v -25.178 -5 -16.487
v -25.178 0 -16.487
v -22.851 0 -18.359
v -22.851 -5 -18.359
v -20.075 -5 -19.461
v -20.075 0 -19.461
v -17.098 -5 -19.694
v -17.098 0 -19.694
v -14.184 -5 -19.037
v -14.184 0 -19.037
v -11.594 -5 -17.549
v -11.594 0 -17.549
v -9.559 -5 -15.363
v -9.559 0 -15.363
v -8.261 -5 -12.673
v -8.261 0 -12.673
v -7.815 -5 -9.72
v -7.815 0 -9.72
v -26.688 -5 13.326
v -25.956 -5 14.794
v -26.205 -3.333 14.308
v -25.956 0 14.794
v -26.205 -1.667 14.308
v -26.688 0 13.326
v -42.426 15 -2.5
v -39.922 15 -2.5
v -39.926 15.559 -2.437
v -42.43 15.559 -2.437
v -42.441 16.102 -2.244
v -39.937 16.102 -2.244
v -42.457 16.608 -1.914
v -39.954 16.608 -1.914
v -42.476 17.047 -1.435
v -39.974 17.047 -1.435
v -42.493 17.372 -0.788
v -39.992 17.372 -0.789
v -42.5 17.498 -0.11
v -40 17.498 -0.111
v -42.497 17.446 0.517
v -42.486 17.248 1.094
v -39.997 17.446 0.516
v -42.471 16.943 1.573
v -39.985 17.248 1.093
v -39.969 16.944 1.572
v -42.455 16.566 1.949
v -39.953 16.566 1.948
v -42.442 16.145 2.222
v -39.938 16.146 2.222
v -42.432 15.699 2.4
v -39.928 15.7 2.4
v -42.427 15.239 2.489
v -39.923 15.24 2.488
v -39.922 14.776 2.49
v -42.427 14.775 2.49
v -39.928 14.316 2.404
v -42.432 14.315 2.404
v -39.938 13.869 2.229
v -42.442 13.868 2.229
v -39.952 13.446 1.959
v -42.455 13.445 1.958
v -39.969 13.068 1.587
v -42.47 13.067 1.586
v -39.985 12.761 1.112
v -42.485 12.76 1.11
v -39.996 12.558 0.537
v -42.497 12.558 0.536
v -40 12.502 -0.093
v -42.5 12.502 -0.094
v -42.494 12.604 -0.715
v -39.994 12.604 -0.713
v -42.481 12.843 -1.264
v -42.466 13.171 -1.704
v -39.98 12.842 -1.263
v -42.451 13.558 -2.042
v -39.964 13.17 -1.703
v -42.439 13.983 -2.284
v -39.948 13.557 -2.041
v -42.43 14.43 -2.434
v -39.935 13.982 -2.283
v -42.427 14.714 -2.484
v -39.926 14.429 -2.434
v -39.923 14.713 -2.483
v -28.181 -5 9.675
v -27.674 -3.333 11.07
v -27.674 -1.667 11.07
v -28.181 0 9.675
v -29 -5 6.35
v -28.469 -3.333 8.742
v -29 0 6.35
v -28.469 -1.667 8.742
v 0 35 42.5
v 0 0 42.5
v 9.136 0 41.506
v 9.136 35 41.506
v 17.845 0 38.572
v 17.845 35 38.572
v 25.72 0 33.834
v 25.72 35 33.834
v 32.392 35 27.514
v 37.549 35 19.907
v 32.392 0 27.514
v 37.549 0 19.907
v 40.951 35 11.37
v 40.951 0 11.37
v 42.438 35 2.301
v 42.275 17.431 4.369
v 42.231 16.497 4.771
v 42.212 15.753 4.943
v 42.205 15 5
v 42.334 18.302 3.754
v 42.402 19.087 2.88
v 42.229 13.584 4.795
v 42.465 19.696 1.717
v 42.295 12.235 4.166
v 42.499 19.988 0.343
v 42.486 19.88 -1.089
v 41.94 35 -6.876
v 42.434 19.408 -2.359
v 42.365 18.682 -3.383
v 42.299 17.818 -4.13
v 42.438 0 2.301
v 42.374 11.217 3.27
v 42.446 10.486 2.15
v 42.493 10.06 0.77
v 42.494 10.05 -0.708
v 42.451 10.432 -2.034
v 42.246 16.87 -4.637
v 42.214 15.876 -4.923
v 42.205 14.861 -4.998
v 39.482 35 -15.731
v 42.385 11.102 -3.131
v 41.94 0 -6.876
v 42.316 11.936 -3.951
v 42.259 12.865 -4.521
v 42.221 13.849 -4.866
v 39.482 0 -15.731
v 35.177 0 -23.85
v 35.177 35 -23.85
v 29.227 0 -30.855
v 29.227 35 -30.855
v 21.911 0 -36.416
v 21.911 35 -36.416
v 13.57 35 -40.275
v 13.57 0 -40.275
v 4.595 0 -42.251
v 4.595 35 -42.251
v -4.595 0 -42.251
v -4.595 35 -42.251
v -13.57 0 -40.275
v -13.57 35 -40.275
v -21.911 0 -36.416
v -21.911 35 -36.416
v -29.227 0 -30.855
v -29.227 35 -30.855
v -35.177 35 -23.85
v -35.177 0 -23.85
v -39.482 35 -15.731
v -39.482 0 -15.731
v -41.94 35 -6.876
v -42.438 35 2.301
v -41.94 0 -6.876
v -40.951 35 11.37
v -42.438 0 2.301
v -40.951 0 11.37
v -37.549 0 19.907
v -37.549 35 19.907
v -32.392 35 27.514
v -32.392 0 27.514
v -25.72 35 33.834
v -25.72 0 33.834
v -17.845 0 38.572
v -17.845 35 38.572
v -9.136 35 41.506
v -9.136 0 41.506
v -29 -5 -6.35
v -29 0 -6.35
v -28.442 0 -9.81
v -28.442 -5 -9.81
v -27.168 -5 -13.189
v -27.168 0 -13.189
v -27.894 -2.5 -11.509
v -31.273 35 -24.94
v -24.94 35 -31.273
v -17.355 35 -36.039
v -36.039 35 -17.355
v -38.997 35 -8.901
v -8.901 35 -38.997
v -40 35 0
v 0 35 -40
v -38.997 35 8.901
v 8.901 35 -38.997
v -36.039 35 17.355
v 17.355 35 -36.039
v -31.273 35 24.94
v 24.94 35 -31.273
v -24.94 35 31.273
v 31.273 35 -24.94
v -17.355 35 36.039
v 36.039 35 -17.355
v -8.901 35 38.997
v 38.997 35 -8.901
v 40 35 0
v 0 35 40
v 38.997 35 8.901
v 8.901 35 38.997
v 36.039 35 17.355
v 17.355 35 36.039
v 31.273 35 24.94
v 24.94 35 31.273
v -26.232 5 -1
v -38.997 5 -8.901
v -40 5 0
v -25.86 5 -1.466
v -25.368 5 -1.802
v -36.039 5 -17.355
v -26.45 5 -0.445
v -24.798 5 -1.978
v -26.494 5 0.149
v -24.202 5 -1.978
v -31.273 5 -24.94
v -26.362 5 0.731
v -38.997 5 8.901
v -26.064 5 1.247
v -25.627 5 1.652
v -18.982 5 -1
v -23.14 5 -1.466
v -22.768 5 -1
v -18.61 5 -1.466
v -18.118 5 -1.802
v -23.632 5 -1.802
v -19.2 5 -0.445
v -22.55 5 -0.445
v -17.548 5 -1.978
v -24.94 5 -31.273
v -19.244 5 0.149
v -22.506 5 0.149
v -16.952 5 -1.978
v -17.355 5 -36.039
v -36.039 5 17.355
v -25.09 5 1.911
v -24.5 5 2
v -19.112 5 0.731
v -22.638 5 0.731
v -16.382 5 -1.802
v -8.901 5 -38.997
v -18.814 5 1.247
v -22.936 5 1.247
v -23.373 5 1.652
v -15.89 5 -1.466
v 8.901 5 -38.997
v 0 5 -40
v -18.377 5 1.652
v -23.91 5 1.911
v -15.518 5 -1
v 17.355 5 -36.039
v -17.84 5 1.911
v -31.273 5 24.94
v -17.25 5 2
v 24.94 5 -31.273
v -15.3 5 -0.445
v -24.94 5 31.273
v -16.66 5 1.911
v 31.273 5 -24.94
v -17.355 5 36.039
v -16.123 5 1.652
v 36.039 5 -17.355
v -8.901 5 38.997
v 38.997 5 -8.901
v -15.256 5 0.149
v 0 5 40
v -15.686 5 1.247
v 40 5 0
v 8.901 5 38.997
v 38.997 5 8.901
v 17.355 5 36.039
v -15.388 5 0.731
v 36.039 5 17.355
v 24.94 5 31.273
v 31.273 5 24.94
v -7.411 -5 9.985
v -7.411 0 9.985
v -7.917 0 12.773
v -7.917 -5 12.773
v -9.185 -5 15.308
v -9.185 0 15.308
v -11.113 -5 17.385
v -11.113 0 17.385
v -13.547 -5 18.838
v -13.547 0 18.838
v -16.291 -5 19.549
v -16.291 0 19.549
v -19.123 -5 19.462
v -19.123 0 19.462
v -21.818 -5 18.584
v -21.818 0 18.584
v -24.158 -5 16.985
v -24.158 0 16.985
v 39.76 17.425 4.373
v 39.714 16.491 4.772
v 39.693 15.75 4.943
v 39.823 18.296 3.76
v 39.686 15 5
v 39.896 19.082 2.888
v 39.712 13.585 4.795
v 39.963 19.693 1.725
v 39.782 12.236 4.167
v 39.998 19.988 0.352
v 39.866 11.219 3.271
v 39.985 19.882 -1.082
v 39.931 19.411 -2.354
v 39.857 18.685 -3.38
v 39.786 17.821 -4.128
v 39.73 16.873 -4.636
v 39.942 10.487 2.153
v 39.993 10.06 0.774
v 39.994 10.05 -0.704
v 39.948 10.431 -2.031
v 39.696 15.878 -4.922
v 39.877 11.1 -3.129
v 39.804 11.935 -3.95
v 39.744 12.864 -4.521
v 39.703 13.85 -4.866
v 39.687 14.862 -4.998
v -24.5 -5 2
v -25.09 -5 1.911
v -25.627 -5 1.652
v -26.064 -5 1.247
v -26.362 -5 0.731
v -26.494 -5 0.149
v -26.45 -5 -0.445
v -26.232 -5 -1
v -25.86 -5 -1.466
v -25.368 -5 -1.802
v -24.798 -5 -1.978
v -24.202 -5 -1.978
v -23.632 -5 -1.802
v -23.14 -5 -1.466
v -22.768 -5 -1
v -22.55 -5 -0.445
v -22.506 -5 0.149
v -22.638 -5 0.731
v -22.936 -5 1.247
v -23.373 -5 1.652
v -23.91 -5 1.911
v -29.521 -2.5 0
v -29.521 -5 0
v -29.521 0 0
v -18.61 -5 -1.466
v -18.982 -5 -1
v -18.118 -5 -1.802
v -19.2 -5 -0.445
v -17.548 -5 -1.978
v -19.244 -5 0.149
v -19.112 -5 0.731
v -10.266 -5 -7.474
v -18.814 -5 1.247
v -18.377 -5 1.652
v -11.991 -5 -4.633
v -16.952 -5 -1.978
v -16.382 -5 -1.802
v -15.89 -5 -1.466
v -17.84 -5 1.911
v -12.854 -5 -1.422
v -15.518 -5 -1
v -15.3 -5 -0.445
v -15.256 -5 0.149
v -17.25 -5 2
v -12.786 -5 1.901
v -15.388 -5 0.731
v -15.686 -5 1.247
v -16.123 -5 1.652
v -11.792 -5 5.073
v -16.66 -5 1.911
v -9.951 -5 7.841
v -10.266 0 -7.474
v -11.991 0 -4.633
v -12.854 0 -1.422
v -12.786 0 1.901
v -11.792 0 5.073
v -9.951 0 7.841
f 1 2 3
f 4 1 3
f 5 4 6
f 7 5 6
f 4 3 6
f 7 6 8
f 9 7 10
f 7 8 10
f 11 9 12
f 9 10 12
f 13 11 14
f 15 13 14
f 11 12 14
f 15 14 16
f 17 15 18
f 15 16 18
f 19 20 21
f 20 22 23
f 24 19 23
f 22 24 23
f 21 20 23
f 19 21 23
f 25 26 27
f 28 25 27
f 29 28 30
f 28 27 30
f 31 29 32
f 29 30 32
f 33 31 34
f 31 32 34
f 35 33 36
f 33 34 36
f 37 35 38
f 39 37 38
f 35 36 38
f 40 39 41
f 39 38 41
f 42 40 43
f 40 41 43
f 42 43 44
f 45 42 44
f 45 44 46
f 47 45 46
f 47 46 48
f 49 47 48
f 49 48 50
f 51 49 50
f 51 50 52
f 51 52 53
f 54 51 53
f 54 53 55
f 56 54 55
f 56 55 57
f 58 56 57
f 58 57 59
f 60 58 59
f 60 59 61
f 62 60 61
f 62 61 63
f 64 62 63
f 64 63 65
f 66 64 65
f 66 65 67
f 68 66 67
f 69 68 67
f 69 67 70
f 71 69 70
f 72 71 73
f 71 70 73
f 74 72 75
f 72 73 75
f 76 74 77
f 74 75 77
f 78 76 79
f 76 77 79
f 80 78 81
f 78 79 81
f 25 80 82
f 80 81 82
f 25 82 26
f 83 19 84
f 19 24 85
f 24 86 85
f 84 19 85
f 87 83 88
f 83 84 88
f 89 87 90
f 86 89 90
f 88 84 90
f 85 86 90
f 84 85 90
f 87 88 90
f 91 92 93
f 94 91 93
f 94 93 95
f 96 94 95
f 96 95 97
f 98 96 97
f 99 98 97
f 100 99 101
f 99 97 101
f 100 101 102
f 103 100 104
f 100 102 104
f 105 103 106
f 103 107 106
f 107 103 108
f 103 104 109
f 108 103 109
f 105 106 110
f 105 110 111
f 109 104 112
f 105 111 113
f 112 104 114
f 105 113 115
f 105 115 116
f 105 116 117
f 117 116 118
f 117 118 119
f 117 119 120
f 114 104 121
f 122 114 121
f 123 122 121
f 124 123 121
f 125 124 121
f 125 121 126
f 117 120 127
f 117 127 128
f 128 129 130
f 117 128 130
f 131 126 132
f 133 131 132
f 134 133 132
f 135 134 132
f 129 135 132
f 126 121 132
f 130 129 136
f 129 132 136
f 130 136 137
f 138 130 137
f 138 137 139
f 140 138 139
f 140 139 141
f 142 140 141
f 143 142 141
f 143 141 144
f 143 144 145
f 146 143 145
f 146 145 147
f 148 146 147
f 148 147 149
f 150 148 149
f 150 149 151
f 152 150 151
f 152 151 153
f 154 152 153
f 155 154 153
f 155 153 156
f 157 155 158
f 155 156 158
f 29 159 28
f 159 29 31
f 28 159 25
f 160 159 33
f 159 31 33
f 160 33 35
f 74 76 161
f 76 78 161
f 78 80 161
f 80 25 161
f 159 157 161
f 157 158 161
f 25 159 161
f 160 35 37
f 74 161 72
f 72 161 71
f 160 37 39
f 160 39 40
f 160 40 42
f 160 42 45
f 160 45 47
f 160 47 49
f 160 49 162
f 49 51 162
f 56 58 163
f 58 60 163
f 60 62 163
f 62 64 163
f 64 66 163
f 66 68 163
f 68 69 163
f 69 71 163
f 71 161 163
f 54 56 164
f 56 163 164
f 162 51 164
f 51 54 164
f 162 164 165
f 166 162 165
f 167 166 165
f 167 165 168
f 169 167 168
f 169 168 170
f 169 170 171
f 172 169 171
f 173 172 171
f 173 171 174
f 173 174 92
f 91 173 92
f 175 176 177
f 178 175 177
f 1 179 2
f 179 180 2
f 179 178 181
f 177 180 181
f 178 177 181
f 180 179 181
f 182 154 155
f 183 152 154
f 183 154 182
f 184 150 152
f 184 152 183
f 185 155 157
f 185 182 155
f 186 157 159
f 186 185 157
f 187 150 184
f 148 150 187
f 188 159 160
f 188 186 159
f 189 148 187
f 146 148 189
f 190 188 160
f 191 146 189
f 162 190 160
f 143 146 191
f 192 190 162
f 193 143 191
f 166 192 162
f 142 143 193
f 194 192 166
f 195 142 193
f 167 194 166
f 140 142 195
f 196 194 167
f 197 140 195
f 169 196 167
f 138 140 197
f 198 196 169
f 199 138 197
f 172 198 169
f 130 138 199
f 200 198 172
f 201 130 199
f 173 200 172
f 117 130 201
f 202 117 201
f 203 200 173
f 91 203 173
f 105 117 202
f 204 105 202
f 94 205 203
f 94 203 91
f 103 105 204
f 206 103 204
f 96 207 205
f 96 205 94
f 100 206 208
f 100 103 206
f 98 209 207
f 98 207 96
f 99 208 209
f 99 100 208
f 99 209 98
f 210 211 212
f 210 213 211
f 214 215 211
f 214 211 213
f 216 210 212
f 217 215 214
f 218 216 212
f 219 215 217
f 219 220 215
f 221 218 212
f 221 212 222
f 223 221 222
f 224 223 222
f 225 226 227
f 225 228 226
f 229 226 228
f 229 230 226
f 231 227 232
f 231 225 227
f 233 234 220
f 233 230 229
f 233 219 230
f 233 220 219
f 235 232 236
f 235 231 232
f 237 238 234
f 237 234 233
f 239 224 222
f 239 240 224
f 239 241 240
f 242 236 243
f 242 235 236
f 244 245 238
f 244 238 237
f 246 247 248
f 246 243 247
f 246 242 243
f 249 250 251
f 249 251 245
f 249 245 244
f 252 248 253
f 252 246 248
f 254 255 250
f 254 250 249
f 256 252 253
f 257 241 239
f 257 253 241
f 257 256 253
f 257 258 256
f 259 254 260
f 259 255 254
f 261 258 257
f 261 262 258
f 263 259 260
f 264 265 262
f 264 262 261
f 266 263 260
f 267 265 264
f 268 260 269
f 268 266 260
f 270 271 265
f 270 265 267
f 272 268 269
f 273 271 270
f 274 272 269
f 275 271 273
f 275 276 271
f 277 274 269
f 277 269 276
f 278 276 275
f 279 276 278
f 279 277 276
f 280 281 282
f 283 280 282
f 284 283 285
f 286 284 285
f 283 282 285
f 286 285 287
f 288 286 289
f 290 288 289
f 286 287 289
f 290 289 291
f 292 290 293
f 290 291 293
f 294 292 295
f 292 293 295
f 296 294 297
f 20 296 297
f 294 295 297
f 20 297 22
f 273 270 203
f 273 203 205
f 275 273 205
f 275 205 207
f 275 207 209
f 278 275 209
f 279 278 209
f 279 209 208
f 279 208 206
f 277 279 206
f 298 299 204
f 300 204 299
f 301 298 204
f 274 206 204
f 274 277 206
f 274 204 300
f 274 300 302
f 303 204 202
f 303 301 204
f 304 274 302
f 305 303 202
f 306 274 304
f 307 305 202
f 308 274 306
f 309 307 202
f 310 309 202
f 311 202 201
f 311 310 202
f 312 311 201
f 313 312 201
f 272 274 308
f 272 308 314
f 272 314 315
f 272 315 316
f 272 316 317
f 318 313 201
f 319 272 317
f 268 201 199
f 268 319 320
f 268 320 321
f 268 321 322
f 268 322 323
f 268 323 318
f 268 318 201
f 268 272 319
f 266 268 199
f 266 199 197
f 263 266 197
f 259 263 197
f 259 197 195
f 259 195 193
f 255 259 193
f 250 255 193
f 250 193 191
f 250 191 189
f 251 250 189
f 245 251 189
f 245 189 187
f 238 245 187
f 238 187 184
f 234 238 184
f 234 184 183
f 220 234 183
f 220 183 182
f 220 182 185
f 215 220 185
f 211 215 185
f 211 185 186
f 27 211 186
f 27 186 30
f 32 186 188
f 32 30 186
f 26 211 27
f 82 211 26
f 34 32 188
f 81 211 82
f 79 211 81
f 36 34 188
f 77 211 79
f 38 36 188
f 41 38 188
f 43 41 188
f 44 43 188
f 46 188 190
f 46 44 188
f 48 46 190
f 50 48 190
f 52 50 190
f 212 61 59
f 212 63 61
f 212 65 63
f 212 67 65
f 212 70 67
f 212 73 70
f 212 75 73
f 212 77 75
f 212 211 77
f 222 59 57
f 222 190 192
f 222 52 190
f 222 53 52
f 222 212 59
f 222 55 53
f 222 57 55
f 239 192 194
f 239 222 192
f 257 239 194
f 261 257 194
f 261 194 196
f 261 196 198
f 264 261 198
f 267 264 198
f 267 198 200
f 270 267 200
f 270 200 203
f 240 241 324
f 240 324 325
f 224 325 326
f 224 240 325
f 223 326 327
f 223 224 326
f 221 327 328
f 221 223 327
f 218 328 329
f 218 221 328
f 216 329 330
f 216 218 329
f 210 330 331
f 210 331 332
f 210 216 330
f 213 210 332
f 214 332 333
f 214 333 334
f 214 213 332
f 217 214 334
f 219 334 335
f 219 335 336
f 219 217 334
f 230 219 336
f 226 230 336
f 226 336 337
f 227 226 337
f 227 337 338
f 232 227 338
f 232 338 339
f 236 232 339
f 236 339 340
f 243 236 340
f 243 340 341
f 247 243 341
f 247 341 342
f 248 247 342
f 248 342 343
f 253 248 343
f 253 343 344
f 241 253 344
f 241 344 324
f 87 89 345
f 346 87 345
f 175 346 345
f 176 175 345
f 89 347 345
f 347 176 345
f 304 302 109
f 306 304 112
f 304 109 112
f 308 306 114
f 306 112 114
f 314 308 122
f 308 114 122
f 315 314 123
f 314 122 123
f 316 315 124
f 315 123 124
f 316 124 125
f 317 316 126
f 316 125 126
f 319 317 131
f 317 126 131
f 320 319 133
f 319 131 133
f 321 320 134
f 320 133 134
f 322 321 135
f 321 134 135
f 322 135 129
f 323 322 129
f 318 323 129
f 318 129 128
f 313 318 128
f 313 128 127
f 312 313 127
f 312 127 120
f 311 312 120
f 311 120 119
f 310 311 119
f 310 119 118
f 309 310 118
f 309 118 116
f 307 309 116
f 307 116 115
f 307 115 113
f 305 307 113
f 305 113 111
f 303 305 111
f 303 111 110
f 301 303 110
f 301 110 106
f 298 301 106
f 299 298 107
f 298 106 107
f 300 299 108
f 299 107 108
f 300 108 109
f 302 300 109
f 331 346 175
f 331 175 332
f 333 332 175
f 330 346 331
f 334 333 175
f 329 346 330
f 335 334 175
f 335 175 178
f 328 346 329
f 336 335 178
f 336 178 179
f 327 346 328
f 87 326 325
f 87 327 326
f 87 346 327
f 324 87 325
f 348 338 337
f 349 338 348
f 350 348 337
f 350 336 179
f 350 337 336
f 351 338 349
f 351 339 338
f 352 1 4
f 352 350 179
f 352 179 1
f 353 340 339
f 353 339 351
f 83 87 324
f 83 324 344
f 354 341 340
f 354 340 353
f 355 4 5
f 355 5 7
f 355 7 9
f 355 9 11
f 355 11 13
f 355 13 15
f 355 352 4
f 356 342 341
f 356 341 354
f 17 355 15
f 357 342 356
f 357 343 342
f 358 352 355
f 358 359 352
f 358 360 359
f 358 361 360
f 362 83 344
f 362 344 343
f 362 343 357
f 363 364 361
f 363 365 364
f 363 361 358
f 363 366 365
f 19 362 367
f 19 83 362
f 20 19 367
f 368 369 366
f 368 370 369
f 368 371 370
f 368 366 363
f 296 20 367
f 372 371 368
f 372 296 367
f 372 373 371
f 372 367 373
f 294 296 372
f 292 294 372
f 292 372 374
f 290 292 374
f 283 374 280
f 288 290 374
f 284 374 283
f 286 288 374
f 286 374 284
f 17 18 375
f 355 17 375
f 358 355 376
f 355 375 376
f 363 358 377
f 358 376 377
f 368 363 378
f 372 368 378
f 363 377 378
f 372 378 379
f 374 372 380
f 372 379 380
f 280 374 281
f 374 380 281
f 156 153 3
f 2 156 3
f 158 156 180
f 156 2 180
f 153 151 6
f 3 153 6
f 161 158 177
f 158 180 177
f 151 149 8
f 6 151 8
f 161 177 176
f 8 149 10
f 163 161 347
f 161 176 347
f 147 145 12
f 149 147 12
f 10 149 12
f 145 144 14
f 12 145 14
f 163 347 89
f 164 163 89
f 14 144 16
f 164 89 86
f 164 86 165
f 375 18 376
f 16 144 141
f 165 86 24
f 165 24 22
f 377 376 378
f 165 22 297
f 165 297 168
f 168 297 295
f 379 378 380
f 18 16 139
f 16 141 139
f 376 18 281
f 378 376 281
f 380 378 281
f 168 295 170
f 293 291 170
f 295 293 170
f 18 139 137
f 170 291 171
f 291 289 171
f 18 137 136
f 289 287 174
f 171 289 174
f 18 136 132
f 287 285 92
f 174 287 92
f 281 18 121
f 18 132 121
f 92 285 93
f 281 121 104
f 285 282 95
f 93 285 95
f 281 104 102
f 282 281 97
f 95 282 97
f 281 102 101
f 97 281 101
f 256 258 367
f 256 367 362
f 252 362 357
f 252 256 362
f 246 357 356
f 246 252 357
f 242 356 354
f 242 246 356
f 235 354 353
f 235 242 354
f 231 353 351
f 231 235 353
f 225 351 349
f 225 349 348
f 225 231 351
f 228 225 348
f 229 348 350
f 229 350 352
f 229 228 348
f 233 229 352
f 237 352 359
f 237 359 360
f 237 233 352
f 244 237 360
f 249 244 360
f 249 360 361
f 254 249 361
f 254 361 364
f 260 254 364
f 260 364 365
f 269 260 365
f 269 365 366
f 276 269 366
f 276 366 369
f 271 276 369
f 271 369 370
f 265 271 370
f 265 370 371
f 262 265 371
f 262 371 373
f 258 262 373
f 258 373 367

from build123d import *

# Parameters (mm, degrees)
SKETCH1_R               = 42.5
BOSS_EXTRUDE1_DEPTH     = 5
SKETCH2_R               = 42.5
SKETCH2_R_2             = 40
BOSS_EXTRUDE2_DEPTH     = 30
SKETCH3_R               = 2
BOSS_EXTRUDE3_DEPTH     = 5
CUT_EXTRUDE1_DEPTH      = 70.552138838
CUT_EXTRUDE1_DEPTH_BACK = 70.552138838
SKETCH3_3_R             = 2
CUT_EXTRUDE4_REACH      = 71.552
CUT_EXTRUDE4_END_RADIUS = 42.5
SKETCH4_R               = 2.5
SKETCH4_5_R             = 5
CUT_EXTRUDE8_DEPTH      = 50


with BuildPart() as part:
    # Sketch1 → Boss-Extrude1 (new body)
    with BuildSketch(Plane(origin=(0, 0, 0), x_dir=(1, 0, 0), z_dir=(0, 1, 0))):
        Circle(SKETCH1_R)
    extrude(amount=BOSS_EXTRUDE1_DEPTH)

    # Sketch2 → Boss-Extrude2 (add)
    with BuildSketch(Plane(origin=(0, 5, 0), x_dir=(1, 0, 0), z_dir=(0, 1, 0))):
        Circle(SKETCH2_R)
        Circle(SKETCH2_R_2, mode=Mode.SUBTRACT)
    extrude(amount=BOSS_EXTRUDE2_DEPTH)

    # Sketch3 → Boss-Extrude3 (add)
    with BuildSketch(Plane.XZ):
        with BuildLine():
            ThreePointArc((-25.178047354, -16.486591759), (-14.183962111, -19.037364236), (-7.815144583, -9.719933589))
            ThreePointArc((-7.815144583, -9.719933589), (-12.938182194, 0.241771609), (-7.410610084, 9.984822024))
            ThreePointArc((-7.410610084, 9.984822024), (-14.893502945, 19.290955178), (-25.95577439, 14.793850517))
            add(Edge.make_bspline(
                [(-25.95577439, 14.793850517), (-26.206471304, 14.310519768), (-26.451758672, 13.821089407), (-26.688052402, 13.325870914)],
                knots=[0, 0, 0, 0, 0.050650552, 0.050650552, 0.050650552, 0.050650552], degree=3))
            add(Edge.make_bspline(
                [(-26.688052402, 13.325870914), (-27.746594537, 11.107404767), (-28.624649084, 8.772780294), (-29, 6.35)],
                knots=[0.050650552, 0.050650552, 0.050650552, 0.050650552, 0.277553495, 0.277553495, 0.277553495, 0.277553495], degree=3))
            add(Edge.make_bspline(
                [(-29, 6.35), (-30.042272144, 0), (-29, -6.35)],
                knots=[0, 0, 0, 1, 1, 1], degree=2))
            add(Edge.make_bspline(
                [(-29, -6.35), (-28.699050384, -11.600454078), (-25.178047354, -16.486591759)],
                knots=[0.67268265, 0.67268265, 0.67268265, 1, 1, 1], degree=2))
        make_face()
        with Locations((-24.5, 0)):
            Circle(SKETCH3_R, mode=Mode.SUBTRACT)
        with Locations((-17.25, 0)):
            Circle(SKETCH3_R, mode=Mode.SUBTRACT)
    extrude(amount=BOSS_EXTRUDE3_DEPTH)

    # Sketch3<3> → Cut-Extrude1 (cut, two sides: drawn at the far end of the back side and taken through both)
    with BuildSketch(Plane.XZ.offset(-CUT_EXTRUDE1_DEPTH_BACK)):
        with Locations((-24.5, 0)):
            Circle(SKETCH3_3_R)
        with Locations((-17.25, 0)):
            Circle(SKETCH3_3_R)
    extrude(amount=CUT_EXTRUDE1_DEPTH + CUT_EXTRUDE1_DEPTH_BACK, mode=Mode.SUBTRACT)

    # Cut-Extrude4: up to this cylinder (the profile starts inside it)
    cut_extrude4_end = Plane(origin=(0, 15, 0), z_dir=(0, -1, 0)) * Cylinder(CUT_EXTRUDE4_END_RADIUS, 229.104, mode=Mode.PRIVATE)
    # Sketch4 → Cut-Extrude4 (cut, up to the surface)
    with BuildSketch(Plane(origin=(0, 0, 0), x_dir=(0, 0, -1), z_dir=(1, 0, 0)), mode=Mode.PRIVATE) as cut_extrude4_sk1:
        with Locations((0, 15)):
            Circle(SKETCH4_R)
    cut_extrude4_tool1 = extrude(cut_extrude4_sk1.sketch, amount=-CUT_EXTRUDE4_REACH, mode=Mode.PRIVATE) & cut_extrude4_end
    add(cut_extrude4_tool1.solids().sort_by_distance((0, 15, 0))[0], mode=Mode.SUBTRACT)

    # Sketch4<5> → Cut-Extrude8 (cut)
    with BuildSketch(Plane(origin=(0, 0, 0), x_dir=(0, 0, -1), z_dir=(1, 0, 0))):
        with Locations((0, 15)):
            Circle(SKETCH4_5_R)
    extrude(amount=CUT_EXTRUDE8_DEPTH, mode=Mode.SUBTRACT)


solid = part.part
